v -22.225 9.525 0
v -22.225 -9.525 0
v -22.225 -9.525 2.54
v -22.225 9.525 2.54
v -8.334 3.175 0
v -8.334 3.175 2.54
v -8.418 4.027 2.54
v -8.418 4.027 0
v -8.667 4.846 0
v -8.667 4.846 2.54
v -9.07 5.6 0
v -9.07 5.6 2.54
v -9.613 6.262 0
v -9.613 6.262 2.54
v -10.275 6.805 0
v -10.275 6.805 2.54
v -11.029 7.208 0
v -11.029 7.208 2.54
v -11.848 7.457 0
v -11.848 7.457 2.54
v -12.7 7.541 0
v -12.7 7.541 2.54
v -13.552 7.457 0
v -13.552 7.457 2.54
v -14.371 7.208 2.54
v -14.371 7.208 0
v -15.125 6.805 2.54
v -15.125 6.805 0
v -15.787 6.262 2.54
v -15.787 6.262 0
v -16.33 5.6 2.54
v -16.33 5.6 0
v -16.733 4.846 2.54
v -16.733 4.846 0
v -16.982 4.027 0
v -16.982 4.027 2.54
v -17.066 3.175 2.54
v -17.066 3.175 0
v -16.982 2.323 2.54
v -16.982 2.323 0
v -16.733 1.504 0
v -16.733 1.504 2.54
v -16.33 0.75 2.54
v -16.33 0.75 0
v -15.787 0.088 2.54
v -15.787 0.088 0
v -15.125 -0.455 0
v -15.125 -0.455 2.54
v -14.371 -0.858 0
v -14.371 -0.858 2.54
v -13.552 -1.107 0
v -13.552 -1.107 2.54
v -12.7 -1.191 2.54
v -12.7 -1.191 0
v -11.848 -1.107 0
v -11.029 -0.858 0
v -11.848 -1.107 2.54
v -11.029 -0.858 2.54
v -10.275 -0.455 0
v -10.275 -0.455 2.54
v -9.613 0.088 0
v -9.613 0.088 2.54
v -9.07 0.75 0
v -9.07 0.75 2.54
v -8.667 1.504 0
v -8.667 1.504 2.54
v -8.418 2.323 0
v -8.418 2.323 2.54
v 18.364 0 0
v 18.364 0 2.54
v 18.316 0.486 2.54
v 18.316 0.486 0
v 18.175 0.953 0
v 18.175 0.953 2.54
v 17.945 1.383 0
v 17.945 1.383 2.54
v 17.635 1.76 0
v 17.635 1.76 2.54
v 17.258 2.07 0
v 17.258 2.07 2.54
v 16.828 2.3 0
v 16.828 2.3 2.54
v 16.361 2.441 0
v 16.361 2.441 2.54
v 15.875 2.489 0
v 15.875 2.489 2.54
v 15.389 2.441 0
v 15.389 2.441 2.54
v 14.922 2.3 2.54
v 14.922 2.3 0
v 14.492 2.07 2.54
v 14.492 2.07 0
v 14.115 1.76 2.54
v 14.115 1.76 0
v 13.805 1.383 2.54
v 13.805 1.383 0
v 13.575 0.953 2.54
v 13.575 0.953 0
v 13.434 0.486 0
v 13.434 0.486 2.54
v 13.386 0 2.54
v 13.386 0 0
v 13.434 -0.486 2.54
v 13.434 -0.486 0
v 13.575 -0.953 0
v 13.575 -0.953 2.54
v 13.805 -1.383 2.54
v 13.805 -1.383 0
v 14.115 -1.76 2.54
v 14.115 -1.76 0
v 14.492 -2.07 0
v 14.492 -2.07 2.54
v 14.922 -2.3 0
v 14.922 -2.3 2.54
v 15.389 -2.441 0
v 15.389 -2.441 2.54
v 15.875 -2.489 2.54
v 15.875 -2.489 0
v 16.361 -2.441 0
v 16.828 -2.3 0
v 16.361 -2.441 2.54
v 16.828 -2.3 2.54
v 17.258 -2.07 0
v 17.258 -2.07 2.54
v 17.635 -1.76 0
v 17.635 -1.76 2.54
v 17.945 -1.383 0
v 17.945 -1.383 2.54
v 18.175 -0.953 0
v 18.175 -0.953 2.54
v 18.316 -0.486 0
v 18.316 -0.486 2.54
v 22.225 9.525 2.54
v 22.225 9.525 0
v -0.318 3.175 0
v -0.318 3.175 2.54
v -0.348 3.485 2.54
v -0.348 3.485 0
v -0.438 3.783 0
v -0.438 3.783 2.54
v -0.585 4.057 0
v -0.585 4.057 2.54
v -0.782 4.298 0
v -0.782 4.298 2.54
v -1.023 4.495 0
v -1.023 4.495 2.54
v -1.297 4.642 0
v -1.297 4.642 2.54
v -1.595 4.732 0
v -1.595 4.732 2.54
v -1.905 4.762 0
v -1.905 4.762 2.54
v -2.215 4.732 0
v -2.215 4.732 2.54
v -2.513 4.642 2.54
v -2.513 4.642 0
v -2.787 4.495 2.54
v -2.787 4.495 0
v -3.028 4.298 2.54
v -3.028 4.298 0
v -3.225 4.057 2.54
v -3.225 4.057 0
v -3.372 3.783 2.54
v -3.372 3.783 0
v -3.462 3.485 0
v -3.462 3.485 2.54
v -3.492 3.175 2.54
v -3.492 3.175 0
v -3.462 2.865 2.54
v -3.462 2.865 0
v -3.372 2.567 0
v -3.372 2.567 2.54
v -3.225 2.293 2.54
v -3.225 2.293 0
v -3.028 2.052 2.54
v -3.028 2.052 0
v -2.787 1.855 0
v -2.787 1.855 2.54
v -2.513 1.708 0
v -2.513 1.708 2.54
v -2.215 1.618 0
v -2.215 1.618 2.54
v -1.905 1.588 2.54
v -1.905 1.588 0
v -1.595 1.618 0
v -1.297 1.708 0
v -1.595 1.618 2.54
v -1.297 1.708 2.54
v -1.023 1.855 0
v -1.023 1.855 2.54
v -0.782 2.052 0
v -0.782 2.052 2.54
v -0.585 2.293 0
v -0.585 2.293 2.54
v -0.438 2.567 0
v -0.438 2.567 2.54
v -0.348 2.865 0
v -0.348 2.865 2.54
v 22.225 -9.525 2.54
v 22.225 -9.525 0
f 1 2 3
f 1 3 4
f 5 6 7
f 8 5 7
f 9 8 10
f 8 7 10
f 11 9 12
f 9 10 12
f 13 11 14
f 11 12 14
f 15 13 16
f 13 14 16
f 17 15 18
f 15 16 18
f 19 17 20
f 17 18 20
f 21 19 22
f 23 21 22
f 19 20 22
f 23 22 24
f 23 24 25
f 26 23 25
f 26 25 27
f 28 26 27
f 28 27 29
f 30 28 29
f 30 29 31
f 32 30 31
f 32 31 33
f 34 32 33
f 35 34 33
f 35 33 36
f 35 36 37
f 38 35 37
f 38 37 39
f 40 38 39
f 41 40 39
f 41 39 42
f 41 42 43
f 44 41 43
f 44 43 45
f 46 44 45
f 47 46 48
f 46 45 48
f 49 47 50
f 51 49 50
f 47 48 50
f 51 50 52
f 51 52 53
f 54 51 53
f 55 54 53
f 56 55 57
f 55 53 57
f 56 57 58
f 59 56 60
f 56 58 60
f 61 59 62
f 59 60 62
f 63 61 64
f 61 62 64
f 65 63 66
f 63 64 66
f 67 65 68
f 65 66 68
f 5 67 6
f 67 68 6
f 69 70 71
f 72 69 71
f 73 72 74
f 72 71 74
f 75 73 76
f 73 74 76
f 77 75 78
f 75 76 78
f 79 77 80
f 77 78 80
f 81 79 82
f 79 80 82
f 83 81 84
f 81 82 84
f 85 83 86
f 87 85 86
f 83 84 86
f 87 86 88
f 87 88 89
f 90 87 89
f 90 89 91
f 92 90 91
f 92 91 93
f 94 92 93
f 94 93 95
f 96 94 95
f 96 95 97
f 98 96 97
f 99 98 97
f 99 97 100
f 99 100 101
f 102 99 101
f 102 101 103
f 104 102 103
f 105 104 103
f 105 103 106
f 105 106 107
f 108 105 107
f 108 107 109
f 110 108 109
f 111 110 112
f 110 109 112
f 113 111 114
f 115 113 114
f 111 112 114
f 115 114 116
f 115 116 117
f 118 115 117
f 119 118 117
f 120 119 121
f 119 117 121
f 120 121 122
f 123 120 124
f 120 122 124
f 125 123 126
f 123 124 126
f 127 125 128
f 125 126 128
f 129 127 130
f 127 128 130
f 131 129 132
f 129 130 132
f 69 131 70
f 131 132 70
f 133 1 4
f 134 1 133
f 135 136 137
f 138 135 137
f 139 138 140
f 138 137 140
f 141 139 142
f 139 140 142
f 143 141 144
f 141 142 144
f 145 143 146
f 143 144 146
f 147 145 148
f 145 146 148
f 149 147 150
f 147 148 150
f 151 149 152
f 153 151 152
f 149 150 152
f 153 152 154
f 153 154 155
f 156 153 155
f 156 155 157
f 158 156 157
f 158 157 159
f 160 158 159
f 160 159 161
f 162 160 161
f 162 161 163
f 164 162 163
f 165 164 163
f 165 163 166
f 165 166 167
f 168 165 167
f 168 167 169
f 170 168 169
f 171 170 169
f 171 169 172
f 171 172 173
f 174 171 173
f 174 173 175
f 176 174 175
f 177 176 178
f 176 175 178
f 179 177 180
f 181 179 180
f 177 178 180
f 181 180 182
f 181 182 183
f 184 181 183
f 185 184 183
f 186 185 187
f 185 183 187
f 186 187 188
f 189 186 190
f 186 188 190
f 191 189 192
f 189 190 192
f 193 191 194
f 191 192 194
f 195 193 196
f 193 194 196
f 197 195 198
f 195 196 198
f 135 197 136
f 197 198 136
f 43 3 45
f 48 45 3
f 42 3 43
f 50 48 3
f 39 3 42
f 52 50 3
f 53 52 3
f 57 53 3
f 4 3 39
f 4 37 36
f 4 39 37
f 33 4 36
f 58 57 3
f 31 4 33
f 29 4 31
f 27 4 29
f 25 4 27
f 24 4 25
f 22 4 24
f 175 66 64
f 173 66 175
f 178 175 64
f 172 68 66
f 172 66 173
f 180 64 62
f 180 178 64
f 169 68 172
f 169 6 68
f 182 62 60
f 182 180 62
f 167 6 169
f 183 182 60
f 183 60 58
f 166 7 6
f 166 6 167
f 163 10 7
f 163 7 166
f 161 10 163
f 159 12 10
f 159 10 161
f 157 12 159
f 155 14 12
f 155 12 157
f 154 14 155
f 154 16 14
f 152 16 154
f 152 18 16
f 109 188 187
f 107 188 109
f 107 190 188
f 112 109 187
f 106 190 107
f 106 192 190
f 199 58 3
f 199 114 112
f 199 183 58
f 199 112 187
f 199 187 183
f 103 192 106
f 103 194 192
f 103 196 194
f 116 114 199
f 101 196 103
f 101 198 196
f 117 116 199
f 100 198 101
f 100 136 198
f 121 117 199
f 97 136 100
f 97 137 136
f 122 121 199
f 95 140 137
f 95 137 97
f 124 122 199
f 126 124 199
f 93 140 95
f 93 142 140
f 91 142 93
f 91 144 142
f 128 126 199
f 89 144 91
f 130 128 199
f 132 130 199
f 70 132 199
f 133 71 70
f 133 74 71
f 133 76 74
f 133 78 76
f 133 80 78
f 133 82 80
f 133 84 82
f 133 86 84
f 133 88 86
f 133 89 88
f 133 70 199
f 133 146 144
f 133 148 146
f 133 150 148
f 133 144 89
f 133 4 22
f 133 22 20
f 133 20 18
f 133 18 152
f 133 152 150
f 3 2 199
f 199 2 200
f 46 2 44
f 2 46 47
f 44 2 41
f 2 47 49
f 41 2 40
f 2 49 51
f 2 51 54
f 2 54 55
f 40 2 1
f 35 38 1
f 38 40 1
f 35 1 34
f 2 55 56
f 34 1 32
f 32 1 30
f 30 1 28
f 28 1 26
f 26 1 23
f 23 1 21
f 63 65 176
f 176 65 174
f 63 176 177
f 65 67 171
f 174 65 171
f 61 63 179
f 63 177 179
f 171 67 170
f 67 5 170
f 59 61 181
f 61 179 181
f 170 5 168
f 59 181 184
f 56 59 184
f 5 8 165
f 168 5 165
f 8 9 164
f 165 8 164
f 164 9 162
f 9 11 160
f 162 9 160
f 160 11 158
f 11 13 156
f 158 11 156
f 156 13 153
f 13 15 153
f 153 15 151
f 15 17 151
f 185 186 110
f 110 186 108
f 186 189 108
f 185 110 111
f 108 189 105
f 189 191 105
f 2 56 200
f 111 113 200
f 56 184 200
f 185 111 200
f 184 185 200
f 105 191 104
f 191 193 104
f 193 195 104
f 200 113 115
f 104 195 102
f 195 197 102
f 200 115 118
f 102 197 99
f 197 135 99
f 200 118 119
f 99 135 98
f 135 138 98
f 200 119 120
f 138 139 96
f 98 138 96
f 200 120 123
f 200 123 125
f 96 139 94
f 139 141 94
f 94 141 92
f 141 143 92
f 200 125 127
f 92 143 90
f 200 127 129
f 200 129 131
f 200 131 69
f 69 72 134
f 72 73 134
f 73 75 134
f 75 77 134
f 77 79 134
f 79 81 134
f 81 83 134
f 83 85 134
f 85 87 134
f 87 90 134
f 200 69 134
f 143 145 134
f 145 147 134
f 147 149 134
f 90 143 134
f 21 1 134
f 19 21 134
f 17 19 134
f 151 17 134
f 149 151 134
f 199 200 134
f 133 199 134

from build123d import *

# Parameters (mm, degrees)
SKETCH1_W           = 44.45
SKETCH1_H           = 19.05
BOSS_EXTRUDE1_DEPTH = 2.54
CUT_EXTRUDE1_REACH  = 26.313
SKETCH2_R           = 4.365625
SKETCH2_R_2         = 1.5875
SKETCH2_R_3         = 2.4892


with BuildPart() as part:
    # Sketch1 → Boss-Extrude1 (new body)
    with BuildSketch(Plane.XY):
        Rectangle(SKETCH1_W, SKETCH1_H)
    extrude(amount=BOSS_EXTRUDE1_DEPTH)

    # Sketch2 → Cut-Extrude1 (cut, up to next)
    with BuildSketch(Plane.XY.offset(2.54), mode=Mode.PRIVATE) as cut_extrude1_sk1:
        with Locations((-12.7, 3.175)):
            Circle(SKETCH2_R)
    cut_extrude1_tool1 = extrude(cut_extrude1_sk1.sketch, amount=-CUT_EXTRUDE1_REACH, mode=Mode.PRIVATE) & part.part
    # Sketch2 → Cut-Extrude1 (cut, up to next)
    with BuildSketch(Plane.XY.offset(2.54), mode=Mode.PRIVATE) as cut_extrude1_sk2:
        with Locations((-1.905, 3.175)):
            Circle(SKETCH2_R_2)
    cut_extrude1_tool2 = extrude(cut_extrude1_sk2.sketch, amount=-CUT_EXTRUDE1_REACH, mode=Mode.PRIVATE) & part.part
    # Sketch2 → Cut-Extrude1 (cut, up to next)
    with BuildSketch(Plane.XY.offset(2.54), mode=Mode.PRIVATE) as cut_extrude1_sk3:
        with Locations((15.875, 0)):
            Circle(SKETCH2_R_3)
    cut_extrude1_tool3 = extrude(cut_extrude1_sk3.sketch, amount=-CUT_EXTRUDE1_REACH, mode=Mode.PRIVATE) & part.part
    add(cut_extrude1_tool1.solids().sort_by_distance((-12.7, 3.175, 2.54))[0], mode=Mode.SUBTRACT)
    add(cut_extrude1_tool2.solids().sort_by_distance((-1.905, 3.175, 2.54))[0], mode=Mode.SUBTRACT)
    add(cut_extrude1_tool3.solids().sort_by_distance((15.875, 0, 2.54))[0], mode=Mode.SUBTRACT)


solid = part.part
